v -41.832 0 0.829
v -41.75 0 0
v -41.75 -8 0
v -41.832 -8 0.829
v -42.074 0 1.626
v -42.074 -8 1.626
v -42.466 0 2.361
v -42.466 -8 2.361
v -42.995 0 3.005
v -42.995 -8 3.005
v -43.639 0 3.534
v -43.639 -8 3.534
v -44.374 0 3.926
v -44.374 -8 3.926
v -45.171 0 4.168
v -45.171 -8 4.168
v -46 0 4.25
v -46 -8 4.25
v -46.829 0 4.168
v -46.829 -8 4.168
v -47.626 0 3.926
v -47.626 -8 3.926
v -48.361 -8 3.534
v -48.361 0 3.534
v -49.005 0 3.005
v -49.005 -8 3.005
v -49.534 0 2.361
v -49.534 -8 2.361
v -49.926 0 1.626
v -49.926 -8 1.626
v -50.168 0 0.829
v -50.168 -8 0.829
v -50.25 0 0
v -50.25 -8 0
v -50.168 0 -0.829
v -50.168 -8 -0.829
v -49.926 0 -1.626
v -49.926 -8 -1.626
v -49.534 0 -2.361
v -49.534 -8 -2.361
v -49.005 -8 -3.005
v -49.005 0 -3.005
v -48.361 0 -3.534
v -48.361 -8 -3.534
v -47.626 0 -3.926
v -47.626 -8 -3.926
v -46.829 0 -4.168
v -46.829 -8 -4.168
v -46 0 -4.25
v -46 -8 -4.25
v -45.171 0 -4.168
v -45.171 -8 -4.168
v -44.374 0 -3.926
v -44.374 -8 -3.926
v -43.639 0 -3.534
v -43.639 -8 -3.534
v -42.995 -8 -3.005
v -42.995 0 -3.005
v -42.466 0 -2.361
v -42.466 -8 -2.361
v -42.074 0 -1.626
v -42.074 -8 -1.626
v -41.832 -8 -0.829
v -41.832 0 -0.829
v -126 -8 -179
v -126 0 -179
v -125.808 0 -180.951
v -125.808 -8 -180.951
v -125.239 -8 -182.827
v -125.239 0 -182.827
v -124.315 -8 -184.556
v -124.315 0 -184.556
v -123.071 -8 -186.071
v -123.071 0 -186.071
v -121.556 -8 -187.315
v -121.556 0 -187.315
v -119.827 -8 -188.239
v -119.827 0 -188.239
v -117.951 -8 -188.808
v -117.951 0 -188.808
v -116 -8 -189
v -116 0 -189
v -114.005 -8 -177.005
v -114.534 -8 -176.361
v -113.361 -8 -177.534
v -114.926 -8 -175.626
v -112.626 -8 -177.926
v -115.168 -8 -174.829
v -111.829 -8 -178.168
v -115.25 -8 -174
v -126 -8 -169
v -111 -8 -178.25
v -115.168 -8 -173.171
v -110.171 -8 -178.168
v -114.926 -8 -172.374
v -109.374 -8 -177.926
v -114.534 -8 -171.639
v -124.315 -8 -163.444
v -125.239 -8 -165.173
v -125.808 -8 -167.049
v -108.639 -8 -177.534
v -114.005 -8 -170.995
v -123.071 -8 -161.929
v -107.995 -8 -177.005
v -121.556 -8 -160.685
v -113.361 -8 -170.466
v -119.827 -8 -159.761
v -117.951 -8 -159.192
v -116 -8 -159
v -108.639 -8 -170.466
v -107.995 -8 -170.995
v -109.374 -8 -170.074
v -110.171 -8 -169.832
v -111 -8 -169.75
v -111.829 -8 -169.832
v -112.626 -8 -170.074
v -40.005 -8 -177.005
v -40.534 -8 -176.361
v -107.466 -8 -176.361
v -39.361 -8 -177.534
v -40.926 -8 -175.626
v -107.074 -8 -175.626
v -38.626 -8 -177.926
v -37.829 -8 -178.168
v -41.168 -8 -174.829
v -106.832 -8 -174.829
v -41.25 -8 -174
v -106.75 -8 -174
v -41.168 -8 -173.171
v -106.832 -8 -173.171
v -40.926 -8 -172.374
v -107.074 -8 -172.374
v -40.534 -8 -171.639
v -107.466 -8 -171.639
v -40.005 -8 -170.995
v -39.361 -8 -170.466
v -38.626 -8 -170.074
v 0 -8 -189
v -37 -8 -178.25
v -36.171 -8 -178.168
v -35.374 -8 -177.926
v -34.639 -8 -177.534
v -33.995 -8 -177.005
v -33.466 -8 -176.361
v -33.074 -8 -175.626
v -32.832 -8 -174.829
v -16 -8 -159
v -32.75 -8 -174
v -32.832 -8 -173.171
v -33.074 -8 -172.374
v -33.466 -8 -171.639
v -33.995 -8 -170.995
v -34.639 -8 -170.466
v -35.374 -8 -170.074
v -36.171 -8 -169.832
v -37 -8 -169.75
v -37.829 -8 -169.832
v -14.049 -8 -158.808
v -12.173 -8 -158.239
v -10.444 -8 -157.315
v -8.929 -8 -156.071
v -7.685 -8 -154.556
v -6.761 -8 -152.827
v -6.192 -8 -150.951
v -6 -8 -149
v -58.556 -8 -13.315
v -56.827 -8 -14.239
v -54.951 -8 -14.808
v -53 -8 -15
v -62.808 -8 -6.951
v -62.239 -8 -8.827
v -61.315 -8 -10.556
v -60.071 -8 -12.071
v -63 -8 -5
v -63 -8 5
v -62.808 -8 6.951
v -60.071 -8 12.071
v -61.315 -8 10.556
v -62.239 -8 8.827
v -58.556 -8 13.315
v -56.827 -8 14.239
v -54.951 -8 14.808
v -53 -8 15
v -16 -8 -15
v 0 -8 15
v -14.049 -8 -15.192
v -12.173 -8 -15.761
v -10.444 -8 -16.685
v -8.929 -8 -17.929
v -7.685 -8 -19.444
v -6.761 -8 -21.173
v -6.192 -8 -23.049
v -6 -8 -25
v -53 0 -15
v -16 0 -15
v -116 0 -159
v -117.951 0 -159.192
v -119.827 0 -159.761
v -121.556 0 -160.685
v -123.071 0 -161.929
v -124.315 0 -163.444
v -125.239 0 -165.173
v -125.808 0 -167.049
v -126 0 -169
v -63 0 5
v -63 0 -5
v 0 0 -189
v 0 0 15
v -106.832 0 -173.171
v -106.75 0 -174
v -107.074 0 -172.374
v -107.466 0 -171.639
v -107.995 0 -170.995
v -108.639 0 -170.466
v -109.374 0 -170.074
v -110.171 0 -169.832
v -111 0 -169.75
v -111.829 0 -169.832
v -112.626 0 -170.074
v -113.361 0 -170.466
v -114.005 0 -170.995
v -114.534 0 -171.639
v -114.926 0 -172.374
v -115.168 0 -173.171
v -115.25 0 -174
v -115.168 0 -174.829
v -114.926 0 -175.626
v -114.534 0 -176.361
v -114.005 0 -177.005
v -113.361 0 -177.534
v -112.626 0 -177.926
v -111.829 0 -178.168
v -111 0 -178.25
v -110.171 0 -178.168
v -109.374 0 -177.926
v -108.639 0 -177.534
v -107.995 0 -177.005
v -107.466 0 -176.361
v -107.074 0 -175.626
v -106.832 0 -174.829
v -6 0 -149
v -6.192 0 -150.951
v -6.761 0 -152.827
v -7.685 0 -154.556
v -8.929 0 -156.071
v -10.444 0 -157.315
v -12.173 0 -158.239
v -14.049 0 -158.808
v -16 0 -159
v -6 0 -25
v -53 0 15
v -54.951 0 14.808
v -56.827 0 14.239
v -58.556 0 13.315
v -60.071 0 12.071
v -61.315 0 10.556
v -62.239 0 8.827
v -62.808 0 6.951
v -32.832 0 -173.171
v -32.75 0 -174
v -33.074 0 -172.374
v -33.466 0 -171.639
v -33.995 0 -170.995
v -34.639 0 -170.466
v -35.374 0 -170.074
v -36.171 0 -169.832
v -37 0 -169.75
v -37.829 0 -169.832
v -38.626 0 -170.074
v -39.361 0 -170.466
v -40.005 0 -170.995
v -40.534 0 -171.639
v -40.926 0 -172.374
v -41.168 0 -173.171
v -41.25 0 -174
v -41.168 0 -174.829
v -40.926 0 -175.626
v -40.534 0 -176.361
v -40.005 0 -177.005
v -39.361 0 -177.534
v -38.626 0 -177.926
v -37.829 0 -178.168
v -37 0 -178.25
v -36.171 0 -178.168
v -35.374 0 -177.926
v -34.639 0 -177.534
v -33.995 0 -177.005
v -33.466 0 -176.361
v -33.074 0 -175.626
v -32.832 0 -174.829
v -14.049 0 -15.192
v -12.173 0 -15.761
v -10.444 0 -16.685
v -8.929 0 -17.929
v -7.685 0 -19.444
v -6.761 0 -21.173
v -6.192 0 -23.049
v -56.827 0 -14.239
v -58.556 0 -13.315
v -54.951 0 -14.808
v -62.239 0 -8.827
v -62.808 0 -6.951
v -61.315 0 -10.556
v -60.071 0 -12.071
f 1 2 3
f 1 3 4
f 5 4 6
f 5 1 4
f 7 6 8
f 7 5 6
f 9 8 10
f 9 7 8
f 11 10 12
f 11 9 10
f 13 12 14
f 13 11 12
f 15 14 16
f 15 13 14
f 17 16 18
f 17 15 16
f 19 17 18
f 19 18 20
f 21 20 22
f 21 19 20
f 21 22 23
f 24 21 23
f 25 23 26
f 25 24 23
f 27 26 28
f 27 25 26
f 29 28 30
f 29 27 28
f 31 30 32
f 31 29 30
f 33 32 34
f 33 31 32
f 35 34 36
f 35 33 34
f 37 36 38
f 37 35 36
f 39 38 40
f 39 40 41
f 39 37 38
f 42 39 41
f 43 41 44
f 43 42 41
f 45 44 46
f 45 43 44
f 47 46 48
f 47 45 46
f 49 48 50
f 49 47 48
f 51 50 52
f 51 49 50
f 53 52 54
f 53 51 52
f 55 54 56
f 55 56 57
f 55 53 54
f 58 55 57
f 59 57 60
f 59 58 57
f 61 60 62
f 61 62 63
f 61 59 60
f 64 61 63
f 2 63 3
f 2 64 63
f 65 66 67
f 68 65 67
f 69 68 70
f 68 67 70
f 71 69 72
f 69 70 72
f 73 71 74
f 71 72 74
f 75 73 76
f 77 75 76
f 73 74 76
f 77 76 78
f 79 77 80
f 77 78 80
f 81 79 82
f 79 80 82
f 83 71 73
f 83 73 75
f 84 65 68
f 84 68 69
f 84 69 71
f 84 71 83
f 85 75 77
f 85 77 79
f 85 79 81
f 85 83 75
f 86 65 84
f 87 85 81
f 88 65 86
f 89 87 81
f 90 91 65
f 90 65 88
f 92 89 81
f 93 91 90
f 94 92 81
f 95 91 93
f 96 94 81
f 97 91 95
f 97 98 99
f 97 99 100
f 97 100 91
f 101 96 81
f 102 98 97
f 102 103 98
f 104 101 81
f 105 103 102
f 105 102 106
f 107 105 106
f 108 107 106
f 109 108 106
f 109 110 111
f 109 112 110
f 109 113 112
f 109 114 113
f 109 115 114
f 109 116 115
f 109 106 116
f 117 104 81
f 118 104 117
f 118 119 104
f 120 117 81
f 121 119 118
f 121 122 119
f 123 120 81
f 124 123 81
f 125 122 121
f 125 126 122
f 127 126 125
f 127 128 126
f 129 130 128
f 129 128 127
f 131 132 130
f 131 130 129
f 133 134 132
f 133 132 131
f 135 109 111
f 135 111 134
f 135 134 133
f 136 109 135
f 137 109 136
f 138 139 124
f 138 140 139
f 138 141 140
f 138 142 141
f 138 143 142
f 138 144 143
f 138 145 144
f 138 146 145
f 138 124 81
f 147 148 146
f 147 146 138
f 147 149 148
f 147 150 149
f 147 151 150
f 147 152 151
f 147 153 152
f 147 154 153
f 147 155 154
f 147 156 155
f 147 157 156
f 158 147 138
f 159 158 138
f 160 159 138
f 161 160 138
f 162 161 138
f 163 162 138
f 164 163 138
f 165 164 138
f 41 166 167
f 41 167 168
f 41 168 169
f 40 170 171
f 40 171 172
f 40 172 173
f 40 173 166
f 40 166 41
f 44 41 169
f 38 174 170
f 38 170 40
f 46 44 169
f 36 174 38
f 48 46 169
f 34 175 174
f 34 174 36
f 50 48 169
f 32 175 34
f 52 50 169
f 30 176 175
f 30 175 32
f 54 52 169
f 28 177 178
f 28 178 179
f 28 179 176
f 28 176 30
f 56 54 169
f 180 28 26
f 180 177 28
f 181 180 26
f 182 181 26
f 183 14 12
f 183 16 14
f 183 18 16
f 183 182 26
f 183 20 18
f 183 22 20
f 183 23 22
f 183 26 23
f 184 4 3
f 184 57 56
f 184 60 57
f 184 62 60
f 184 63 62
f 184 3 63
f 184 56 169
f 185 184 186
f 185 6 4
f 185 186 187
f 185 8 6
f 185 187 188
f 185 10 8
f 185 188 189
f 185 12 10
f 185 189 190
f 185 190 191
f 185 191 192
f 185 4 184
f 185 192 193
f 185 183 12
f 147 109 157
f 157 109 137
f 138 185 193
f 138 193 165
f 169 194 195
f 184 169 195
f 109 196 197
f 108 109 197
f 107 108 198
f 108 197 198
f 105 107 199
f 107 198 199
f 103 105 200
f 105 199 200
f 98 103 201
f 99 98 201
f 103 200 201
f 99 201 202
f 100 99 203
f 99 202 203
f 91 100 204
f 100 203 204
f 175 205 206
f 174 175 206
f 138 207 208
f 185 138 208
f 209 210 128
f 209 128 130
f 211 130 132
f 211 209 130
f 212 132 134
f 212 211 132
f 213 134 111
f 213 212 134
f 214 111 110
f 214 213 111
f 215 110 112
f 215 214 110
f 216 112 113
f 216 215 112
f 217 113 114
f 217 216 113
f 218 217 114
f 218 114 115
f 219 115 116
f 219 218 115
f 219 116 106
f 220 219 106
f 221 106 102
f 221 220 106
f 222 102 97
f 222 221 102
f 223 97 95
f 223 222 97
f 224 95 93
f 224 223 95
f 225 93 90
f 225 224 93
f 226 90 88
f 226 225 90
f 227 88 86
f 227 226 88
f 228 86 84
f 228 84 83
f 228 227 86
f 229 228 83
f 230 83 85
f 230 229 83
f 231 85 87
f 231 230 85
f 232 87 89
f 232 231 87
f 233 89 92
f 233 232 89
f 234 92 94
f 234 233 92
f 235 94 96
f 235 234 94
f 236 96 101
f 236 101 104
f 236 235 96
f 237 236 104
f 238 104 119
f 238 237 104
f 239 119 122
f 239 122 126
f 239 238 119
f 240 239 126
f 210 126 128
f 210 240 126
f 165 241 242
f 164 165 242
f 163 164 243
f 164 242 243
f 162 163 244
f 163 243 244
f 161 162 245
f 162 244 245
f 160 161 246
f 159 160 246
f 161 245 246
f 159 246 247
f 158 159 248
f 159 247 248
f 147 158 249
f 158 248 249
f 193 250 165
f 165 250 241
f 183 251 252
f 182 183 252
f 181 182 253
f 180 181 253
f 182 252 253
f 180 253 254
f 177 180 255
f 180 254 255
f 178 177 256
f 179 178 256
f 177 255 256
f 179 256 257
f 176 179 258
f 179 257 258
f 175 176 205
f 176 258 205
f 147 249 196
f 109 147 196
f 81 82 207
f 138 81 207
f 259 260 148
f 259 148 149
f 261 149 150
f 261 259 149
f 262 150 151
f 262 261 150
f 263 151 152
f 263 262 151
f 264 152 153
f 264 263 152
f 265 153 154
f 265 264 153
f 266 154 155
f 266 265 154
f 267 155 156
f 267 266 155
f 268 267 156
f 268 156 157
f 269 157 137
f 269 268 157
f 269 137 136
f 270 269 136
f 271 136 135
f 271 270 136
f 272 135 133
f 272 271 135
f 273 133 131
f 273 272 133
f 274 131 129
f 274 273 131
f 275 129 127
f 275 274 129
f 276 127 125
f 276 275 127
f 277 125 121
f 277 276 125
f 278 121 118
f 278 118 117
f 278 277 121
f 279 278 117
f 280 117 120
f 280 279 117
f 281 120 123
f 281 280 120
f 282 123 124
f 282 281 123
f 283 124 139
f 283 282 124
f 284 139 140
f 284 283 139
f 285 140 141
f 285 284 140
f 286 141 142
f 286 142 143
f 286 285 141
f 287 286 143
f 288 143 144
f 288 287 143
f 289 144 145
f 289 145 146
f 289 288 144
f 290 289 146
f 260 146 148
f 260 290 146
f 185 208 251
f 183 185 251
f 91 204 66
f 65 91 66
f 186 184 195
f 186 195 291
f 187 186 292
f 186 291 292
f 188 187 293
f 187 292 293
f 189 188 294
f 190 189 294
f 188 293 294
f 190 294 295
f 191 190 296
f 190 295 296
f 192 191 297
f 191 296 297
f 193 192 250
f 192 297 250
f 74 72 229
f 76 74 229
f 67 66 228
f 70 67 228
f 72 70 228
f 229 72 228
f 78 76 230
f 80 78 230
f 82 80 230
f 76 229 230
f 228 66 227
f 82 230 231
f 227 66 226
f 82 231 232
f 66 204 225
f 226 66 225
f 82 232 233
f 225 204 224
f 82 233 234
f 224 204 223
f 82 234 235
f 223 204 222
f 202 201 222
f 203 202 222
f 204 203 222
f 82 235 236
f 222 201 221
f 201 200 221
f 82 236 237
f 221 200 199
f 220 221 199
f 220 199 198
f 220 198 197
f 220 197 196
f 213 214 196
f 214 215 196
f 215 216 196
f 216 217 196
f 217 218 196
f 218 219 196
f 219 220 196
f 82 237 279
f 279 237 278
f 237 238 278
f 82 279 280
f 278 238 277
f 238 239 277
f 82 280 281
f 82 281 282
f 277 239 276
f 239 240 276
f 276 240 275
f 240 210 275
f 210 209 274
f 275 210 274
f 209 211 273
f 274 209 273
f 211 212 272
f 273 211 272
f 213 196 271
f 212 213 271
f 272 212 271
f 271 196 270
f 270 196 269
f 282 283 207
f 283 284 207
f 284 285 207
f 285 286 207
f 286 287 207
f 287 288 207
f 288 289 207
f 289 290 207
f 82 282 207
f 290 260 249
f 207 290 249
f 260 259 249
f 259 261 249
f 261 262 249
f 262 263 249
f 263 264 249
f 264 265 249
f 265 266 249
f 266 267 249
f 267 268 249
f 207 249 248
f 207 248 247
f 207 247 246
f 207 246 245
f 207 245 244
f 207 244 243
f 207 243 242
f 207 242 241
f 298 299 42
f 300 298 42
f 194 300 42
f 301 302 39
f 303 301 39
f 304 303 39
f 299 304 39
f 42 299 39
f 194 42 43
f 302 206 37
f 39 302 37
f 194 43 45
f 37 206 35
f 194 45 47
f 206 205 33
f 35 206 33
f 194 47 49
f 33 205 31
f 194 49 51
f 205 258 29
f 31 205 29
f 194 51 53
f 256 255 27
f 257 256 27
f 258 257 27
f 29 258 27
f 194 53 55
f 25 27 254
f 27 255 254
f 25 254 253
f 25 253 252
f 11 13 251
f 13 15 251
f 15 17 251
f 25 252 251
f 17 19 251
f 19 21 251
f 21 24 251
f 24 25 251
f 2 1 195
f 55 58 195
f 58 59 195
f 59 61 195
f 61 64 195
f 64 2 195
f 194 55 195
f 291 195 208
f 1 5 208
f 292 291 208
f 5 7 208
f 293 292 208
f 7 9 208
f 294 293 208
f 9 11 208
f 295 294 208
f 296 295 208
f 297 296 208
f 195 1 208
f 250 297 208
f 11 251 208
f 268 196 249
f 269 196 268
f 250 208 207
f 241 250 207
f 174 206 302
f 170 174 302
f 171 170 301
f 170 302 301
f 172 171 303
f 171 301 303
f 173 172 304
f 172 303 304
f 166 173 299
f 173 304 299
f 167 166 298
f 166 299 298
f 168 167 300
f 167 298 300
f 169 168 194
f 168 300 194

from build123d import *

# Parameters (mm, degrees)
F0_R     = 4.25
F1_DEPTH = 8


with BuildPart() as f1:
    # F0 (on Front) → F1 (new body)
    with BuildSketch(Plane.XZ):
        with BuildLine():
            Line((0, -183.0111), (0, 0))
            Line((0, 0), (0, 15))
            Line((0, 15), (-53, 15))
            ThreePointArc((-53, 15), (-60.071068, 12.071068), (-63, 5))
            Line((-63, 5), (-63, -5))
            ThreePointArc((-63, -5), (-60.071068, -12.071068), (-53, -15))
            Line((-53, -15), (-16, -15))
            ThreePointArc((-16, -15), (-8.928932, -17.928932), (-6, -25))
            Line((-6, -25), (-6, -149))
            ThreePointArc((-6, -149), (-8.928932, -156.071068), (-16, -159))
            Line((-16, -159), (-22.579605, -159))
            Line((-22.579605, -159), (-116, -159))
            ThreePointArc((-116, -159), (-123.071068, -161.928932), (-126, -169))
            Line((-126, -169), (-126, -179))
            ThreePointArc((-126, -179), (-123.071068, -186.071068), (-116, -189))
            Line((-116, -189), (0, -189))
            Line((0, -189), (0, -183.0111))
        make_face()
        with Locations((-111, -174)):
            Circle(F0_R, mode=Mode.SUBTRACT)
        with Locations((-37, -174)):
            Circle(F0_R, mode=Mode.SUBTRACT)
        with Locations((-46, 0)):
            Circle(F0_R, mode=Mode.SUBTRACT)
    extrude(amount=F1_DEPTH)


solid = f1.part
